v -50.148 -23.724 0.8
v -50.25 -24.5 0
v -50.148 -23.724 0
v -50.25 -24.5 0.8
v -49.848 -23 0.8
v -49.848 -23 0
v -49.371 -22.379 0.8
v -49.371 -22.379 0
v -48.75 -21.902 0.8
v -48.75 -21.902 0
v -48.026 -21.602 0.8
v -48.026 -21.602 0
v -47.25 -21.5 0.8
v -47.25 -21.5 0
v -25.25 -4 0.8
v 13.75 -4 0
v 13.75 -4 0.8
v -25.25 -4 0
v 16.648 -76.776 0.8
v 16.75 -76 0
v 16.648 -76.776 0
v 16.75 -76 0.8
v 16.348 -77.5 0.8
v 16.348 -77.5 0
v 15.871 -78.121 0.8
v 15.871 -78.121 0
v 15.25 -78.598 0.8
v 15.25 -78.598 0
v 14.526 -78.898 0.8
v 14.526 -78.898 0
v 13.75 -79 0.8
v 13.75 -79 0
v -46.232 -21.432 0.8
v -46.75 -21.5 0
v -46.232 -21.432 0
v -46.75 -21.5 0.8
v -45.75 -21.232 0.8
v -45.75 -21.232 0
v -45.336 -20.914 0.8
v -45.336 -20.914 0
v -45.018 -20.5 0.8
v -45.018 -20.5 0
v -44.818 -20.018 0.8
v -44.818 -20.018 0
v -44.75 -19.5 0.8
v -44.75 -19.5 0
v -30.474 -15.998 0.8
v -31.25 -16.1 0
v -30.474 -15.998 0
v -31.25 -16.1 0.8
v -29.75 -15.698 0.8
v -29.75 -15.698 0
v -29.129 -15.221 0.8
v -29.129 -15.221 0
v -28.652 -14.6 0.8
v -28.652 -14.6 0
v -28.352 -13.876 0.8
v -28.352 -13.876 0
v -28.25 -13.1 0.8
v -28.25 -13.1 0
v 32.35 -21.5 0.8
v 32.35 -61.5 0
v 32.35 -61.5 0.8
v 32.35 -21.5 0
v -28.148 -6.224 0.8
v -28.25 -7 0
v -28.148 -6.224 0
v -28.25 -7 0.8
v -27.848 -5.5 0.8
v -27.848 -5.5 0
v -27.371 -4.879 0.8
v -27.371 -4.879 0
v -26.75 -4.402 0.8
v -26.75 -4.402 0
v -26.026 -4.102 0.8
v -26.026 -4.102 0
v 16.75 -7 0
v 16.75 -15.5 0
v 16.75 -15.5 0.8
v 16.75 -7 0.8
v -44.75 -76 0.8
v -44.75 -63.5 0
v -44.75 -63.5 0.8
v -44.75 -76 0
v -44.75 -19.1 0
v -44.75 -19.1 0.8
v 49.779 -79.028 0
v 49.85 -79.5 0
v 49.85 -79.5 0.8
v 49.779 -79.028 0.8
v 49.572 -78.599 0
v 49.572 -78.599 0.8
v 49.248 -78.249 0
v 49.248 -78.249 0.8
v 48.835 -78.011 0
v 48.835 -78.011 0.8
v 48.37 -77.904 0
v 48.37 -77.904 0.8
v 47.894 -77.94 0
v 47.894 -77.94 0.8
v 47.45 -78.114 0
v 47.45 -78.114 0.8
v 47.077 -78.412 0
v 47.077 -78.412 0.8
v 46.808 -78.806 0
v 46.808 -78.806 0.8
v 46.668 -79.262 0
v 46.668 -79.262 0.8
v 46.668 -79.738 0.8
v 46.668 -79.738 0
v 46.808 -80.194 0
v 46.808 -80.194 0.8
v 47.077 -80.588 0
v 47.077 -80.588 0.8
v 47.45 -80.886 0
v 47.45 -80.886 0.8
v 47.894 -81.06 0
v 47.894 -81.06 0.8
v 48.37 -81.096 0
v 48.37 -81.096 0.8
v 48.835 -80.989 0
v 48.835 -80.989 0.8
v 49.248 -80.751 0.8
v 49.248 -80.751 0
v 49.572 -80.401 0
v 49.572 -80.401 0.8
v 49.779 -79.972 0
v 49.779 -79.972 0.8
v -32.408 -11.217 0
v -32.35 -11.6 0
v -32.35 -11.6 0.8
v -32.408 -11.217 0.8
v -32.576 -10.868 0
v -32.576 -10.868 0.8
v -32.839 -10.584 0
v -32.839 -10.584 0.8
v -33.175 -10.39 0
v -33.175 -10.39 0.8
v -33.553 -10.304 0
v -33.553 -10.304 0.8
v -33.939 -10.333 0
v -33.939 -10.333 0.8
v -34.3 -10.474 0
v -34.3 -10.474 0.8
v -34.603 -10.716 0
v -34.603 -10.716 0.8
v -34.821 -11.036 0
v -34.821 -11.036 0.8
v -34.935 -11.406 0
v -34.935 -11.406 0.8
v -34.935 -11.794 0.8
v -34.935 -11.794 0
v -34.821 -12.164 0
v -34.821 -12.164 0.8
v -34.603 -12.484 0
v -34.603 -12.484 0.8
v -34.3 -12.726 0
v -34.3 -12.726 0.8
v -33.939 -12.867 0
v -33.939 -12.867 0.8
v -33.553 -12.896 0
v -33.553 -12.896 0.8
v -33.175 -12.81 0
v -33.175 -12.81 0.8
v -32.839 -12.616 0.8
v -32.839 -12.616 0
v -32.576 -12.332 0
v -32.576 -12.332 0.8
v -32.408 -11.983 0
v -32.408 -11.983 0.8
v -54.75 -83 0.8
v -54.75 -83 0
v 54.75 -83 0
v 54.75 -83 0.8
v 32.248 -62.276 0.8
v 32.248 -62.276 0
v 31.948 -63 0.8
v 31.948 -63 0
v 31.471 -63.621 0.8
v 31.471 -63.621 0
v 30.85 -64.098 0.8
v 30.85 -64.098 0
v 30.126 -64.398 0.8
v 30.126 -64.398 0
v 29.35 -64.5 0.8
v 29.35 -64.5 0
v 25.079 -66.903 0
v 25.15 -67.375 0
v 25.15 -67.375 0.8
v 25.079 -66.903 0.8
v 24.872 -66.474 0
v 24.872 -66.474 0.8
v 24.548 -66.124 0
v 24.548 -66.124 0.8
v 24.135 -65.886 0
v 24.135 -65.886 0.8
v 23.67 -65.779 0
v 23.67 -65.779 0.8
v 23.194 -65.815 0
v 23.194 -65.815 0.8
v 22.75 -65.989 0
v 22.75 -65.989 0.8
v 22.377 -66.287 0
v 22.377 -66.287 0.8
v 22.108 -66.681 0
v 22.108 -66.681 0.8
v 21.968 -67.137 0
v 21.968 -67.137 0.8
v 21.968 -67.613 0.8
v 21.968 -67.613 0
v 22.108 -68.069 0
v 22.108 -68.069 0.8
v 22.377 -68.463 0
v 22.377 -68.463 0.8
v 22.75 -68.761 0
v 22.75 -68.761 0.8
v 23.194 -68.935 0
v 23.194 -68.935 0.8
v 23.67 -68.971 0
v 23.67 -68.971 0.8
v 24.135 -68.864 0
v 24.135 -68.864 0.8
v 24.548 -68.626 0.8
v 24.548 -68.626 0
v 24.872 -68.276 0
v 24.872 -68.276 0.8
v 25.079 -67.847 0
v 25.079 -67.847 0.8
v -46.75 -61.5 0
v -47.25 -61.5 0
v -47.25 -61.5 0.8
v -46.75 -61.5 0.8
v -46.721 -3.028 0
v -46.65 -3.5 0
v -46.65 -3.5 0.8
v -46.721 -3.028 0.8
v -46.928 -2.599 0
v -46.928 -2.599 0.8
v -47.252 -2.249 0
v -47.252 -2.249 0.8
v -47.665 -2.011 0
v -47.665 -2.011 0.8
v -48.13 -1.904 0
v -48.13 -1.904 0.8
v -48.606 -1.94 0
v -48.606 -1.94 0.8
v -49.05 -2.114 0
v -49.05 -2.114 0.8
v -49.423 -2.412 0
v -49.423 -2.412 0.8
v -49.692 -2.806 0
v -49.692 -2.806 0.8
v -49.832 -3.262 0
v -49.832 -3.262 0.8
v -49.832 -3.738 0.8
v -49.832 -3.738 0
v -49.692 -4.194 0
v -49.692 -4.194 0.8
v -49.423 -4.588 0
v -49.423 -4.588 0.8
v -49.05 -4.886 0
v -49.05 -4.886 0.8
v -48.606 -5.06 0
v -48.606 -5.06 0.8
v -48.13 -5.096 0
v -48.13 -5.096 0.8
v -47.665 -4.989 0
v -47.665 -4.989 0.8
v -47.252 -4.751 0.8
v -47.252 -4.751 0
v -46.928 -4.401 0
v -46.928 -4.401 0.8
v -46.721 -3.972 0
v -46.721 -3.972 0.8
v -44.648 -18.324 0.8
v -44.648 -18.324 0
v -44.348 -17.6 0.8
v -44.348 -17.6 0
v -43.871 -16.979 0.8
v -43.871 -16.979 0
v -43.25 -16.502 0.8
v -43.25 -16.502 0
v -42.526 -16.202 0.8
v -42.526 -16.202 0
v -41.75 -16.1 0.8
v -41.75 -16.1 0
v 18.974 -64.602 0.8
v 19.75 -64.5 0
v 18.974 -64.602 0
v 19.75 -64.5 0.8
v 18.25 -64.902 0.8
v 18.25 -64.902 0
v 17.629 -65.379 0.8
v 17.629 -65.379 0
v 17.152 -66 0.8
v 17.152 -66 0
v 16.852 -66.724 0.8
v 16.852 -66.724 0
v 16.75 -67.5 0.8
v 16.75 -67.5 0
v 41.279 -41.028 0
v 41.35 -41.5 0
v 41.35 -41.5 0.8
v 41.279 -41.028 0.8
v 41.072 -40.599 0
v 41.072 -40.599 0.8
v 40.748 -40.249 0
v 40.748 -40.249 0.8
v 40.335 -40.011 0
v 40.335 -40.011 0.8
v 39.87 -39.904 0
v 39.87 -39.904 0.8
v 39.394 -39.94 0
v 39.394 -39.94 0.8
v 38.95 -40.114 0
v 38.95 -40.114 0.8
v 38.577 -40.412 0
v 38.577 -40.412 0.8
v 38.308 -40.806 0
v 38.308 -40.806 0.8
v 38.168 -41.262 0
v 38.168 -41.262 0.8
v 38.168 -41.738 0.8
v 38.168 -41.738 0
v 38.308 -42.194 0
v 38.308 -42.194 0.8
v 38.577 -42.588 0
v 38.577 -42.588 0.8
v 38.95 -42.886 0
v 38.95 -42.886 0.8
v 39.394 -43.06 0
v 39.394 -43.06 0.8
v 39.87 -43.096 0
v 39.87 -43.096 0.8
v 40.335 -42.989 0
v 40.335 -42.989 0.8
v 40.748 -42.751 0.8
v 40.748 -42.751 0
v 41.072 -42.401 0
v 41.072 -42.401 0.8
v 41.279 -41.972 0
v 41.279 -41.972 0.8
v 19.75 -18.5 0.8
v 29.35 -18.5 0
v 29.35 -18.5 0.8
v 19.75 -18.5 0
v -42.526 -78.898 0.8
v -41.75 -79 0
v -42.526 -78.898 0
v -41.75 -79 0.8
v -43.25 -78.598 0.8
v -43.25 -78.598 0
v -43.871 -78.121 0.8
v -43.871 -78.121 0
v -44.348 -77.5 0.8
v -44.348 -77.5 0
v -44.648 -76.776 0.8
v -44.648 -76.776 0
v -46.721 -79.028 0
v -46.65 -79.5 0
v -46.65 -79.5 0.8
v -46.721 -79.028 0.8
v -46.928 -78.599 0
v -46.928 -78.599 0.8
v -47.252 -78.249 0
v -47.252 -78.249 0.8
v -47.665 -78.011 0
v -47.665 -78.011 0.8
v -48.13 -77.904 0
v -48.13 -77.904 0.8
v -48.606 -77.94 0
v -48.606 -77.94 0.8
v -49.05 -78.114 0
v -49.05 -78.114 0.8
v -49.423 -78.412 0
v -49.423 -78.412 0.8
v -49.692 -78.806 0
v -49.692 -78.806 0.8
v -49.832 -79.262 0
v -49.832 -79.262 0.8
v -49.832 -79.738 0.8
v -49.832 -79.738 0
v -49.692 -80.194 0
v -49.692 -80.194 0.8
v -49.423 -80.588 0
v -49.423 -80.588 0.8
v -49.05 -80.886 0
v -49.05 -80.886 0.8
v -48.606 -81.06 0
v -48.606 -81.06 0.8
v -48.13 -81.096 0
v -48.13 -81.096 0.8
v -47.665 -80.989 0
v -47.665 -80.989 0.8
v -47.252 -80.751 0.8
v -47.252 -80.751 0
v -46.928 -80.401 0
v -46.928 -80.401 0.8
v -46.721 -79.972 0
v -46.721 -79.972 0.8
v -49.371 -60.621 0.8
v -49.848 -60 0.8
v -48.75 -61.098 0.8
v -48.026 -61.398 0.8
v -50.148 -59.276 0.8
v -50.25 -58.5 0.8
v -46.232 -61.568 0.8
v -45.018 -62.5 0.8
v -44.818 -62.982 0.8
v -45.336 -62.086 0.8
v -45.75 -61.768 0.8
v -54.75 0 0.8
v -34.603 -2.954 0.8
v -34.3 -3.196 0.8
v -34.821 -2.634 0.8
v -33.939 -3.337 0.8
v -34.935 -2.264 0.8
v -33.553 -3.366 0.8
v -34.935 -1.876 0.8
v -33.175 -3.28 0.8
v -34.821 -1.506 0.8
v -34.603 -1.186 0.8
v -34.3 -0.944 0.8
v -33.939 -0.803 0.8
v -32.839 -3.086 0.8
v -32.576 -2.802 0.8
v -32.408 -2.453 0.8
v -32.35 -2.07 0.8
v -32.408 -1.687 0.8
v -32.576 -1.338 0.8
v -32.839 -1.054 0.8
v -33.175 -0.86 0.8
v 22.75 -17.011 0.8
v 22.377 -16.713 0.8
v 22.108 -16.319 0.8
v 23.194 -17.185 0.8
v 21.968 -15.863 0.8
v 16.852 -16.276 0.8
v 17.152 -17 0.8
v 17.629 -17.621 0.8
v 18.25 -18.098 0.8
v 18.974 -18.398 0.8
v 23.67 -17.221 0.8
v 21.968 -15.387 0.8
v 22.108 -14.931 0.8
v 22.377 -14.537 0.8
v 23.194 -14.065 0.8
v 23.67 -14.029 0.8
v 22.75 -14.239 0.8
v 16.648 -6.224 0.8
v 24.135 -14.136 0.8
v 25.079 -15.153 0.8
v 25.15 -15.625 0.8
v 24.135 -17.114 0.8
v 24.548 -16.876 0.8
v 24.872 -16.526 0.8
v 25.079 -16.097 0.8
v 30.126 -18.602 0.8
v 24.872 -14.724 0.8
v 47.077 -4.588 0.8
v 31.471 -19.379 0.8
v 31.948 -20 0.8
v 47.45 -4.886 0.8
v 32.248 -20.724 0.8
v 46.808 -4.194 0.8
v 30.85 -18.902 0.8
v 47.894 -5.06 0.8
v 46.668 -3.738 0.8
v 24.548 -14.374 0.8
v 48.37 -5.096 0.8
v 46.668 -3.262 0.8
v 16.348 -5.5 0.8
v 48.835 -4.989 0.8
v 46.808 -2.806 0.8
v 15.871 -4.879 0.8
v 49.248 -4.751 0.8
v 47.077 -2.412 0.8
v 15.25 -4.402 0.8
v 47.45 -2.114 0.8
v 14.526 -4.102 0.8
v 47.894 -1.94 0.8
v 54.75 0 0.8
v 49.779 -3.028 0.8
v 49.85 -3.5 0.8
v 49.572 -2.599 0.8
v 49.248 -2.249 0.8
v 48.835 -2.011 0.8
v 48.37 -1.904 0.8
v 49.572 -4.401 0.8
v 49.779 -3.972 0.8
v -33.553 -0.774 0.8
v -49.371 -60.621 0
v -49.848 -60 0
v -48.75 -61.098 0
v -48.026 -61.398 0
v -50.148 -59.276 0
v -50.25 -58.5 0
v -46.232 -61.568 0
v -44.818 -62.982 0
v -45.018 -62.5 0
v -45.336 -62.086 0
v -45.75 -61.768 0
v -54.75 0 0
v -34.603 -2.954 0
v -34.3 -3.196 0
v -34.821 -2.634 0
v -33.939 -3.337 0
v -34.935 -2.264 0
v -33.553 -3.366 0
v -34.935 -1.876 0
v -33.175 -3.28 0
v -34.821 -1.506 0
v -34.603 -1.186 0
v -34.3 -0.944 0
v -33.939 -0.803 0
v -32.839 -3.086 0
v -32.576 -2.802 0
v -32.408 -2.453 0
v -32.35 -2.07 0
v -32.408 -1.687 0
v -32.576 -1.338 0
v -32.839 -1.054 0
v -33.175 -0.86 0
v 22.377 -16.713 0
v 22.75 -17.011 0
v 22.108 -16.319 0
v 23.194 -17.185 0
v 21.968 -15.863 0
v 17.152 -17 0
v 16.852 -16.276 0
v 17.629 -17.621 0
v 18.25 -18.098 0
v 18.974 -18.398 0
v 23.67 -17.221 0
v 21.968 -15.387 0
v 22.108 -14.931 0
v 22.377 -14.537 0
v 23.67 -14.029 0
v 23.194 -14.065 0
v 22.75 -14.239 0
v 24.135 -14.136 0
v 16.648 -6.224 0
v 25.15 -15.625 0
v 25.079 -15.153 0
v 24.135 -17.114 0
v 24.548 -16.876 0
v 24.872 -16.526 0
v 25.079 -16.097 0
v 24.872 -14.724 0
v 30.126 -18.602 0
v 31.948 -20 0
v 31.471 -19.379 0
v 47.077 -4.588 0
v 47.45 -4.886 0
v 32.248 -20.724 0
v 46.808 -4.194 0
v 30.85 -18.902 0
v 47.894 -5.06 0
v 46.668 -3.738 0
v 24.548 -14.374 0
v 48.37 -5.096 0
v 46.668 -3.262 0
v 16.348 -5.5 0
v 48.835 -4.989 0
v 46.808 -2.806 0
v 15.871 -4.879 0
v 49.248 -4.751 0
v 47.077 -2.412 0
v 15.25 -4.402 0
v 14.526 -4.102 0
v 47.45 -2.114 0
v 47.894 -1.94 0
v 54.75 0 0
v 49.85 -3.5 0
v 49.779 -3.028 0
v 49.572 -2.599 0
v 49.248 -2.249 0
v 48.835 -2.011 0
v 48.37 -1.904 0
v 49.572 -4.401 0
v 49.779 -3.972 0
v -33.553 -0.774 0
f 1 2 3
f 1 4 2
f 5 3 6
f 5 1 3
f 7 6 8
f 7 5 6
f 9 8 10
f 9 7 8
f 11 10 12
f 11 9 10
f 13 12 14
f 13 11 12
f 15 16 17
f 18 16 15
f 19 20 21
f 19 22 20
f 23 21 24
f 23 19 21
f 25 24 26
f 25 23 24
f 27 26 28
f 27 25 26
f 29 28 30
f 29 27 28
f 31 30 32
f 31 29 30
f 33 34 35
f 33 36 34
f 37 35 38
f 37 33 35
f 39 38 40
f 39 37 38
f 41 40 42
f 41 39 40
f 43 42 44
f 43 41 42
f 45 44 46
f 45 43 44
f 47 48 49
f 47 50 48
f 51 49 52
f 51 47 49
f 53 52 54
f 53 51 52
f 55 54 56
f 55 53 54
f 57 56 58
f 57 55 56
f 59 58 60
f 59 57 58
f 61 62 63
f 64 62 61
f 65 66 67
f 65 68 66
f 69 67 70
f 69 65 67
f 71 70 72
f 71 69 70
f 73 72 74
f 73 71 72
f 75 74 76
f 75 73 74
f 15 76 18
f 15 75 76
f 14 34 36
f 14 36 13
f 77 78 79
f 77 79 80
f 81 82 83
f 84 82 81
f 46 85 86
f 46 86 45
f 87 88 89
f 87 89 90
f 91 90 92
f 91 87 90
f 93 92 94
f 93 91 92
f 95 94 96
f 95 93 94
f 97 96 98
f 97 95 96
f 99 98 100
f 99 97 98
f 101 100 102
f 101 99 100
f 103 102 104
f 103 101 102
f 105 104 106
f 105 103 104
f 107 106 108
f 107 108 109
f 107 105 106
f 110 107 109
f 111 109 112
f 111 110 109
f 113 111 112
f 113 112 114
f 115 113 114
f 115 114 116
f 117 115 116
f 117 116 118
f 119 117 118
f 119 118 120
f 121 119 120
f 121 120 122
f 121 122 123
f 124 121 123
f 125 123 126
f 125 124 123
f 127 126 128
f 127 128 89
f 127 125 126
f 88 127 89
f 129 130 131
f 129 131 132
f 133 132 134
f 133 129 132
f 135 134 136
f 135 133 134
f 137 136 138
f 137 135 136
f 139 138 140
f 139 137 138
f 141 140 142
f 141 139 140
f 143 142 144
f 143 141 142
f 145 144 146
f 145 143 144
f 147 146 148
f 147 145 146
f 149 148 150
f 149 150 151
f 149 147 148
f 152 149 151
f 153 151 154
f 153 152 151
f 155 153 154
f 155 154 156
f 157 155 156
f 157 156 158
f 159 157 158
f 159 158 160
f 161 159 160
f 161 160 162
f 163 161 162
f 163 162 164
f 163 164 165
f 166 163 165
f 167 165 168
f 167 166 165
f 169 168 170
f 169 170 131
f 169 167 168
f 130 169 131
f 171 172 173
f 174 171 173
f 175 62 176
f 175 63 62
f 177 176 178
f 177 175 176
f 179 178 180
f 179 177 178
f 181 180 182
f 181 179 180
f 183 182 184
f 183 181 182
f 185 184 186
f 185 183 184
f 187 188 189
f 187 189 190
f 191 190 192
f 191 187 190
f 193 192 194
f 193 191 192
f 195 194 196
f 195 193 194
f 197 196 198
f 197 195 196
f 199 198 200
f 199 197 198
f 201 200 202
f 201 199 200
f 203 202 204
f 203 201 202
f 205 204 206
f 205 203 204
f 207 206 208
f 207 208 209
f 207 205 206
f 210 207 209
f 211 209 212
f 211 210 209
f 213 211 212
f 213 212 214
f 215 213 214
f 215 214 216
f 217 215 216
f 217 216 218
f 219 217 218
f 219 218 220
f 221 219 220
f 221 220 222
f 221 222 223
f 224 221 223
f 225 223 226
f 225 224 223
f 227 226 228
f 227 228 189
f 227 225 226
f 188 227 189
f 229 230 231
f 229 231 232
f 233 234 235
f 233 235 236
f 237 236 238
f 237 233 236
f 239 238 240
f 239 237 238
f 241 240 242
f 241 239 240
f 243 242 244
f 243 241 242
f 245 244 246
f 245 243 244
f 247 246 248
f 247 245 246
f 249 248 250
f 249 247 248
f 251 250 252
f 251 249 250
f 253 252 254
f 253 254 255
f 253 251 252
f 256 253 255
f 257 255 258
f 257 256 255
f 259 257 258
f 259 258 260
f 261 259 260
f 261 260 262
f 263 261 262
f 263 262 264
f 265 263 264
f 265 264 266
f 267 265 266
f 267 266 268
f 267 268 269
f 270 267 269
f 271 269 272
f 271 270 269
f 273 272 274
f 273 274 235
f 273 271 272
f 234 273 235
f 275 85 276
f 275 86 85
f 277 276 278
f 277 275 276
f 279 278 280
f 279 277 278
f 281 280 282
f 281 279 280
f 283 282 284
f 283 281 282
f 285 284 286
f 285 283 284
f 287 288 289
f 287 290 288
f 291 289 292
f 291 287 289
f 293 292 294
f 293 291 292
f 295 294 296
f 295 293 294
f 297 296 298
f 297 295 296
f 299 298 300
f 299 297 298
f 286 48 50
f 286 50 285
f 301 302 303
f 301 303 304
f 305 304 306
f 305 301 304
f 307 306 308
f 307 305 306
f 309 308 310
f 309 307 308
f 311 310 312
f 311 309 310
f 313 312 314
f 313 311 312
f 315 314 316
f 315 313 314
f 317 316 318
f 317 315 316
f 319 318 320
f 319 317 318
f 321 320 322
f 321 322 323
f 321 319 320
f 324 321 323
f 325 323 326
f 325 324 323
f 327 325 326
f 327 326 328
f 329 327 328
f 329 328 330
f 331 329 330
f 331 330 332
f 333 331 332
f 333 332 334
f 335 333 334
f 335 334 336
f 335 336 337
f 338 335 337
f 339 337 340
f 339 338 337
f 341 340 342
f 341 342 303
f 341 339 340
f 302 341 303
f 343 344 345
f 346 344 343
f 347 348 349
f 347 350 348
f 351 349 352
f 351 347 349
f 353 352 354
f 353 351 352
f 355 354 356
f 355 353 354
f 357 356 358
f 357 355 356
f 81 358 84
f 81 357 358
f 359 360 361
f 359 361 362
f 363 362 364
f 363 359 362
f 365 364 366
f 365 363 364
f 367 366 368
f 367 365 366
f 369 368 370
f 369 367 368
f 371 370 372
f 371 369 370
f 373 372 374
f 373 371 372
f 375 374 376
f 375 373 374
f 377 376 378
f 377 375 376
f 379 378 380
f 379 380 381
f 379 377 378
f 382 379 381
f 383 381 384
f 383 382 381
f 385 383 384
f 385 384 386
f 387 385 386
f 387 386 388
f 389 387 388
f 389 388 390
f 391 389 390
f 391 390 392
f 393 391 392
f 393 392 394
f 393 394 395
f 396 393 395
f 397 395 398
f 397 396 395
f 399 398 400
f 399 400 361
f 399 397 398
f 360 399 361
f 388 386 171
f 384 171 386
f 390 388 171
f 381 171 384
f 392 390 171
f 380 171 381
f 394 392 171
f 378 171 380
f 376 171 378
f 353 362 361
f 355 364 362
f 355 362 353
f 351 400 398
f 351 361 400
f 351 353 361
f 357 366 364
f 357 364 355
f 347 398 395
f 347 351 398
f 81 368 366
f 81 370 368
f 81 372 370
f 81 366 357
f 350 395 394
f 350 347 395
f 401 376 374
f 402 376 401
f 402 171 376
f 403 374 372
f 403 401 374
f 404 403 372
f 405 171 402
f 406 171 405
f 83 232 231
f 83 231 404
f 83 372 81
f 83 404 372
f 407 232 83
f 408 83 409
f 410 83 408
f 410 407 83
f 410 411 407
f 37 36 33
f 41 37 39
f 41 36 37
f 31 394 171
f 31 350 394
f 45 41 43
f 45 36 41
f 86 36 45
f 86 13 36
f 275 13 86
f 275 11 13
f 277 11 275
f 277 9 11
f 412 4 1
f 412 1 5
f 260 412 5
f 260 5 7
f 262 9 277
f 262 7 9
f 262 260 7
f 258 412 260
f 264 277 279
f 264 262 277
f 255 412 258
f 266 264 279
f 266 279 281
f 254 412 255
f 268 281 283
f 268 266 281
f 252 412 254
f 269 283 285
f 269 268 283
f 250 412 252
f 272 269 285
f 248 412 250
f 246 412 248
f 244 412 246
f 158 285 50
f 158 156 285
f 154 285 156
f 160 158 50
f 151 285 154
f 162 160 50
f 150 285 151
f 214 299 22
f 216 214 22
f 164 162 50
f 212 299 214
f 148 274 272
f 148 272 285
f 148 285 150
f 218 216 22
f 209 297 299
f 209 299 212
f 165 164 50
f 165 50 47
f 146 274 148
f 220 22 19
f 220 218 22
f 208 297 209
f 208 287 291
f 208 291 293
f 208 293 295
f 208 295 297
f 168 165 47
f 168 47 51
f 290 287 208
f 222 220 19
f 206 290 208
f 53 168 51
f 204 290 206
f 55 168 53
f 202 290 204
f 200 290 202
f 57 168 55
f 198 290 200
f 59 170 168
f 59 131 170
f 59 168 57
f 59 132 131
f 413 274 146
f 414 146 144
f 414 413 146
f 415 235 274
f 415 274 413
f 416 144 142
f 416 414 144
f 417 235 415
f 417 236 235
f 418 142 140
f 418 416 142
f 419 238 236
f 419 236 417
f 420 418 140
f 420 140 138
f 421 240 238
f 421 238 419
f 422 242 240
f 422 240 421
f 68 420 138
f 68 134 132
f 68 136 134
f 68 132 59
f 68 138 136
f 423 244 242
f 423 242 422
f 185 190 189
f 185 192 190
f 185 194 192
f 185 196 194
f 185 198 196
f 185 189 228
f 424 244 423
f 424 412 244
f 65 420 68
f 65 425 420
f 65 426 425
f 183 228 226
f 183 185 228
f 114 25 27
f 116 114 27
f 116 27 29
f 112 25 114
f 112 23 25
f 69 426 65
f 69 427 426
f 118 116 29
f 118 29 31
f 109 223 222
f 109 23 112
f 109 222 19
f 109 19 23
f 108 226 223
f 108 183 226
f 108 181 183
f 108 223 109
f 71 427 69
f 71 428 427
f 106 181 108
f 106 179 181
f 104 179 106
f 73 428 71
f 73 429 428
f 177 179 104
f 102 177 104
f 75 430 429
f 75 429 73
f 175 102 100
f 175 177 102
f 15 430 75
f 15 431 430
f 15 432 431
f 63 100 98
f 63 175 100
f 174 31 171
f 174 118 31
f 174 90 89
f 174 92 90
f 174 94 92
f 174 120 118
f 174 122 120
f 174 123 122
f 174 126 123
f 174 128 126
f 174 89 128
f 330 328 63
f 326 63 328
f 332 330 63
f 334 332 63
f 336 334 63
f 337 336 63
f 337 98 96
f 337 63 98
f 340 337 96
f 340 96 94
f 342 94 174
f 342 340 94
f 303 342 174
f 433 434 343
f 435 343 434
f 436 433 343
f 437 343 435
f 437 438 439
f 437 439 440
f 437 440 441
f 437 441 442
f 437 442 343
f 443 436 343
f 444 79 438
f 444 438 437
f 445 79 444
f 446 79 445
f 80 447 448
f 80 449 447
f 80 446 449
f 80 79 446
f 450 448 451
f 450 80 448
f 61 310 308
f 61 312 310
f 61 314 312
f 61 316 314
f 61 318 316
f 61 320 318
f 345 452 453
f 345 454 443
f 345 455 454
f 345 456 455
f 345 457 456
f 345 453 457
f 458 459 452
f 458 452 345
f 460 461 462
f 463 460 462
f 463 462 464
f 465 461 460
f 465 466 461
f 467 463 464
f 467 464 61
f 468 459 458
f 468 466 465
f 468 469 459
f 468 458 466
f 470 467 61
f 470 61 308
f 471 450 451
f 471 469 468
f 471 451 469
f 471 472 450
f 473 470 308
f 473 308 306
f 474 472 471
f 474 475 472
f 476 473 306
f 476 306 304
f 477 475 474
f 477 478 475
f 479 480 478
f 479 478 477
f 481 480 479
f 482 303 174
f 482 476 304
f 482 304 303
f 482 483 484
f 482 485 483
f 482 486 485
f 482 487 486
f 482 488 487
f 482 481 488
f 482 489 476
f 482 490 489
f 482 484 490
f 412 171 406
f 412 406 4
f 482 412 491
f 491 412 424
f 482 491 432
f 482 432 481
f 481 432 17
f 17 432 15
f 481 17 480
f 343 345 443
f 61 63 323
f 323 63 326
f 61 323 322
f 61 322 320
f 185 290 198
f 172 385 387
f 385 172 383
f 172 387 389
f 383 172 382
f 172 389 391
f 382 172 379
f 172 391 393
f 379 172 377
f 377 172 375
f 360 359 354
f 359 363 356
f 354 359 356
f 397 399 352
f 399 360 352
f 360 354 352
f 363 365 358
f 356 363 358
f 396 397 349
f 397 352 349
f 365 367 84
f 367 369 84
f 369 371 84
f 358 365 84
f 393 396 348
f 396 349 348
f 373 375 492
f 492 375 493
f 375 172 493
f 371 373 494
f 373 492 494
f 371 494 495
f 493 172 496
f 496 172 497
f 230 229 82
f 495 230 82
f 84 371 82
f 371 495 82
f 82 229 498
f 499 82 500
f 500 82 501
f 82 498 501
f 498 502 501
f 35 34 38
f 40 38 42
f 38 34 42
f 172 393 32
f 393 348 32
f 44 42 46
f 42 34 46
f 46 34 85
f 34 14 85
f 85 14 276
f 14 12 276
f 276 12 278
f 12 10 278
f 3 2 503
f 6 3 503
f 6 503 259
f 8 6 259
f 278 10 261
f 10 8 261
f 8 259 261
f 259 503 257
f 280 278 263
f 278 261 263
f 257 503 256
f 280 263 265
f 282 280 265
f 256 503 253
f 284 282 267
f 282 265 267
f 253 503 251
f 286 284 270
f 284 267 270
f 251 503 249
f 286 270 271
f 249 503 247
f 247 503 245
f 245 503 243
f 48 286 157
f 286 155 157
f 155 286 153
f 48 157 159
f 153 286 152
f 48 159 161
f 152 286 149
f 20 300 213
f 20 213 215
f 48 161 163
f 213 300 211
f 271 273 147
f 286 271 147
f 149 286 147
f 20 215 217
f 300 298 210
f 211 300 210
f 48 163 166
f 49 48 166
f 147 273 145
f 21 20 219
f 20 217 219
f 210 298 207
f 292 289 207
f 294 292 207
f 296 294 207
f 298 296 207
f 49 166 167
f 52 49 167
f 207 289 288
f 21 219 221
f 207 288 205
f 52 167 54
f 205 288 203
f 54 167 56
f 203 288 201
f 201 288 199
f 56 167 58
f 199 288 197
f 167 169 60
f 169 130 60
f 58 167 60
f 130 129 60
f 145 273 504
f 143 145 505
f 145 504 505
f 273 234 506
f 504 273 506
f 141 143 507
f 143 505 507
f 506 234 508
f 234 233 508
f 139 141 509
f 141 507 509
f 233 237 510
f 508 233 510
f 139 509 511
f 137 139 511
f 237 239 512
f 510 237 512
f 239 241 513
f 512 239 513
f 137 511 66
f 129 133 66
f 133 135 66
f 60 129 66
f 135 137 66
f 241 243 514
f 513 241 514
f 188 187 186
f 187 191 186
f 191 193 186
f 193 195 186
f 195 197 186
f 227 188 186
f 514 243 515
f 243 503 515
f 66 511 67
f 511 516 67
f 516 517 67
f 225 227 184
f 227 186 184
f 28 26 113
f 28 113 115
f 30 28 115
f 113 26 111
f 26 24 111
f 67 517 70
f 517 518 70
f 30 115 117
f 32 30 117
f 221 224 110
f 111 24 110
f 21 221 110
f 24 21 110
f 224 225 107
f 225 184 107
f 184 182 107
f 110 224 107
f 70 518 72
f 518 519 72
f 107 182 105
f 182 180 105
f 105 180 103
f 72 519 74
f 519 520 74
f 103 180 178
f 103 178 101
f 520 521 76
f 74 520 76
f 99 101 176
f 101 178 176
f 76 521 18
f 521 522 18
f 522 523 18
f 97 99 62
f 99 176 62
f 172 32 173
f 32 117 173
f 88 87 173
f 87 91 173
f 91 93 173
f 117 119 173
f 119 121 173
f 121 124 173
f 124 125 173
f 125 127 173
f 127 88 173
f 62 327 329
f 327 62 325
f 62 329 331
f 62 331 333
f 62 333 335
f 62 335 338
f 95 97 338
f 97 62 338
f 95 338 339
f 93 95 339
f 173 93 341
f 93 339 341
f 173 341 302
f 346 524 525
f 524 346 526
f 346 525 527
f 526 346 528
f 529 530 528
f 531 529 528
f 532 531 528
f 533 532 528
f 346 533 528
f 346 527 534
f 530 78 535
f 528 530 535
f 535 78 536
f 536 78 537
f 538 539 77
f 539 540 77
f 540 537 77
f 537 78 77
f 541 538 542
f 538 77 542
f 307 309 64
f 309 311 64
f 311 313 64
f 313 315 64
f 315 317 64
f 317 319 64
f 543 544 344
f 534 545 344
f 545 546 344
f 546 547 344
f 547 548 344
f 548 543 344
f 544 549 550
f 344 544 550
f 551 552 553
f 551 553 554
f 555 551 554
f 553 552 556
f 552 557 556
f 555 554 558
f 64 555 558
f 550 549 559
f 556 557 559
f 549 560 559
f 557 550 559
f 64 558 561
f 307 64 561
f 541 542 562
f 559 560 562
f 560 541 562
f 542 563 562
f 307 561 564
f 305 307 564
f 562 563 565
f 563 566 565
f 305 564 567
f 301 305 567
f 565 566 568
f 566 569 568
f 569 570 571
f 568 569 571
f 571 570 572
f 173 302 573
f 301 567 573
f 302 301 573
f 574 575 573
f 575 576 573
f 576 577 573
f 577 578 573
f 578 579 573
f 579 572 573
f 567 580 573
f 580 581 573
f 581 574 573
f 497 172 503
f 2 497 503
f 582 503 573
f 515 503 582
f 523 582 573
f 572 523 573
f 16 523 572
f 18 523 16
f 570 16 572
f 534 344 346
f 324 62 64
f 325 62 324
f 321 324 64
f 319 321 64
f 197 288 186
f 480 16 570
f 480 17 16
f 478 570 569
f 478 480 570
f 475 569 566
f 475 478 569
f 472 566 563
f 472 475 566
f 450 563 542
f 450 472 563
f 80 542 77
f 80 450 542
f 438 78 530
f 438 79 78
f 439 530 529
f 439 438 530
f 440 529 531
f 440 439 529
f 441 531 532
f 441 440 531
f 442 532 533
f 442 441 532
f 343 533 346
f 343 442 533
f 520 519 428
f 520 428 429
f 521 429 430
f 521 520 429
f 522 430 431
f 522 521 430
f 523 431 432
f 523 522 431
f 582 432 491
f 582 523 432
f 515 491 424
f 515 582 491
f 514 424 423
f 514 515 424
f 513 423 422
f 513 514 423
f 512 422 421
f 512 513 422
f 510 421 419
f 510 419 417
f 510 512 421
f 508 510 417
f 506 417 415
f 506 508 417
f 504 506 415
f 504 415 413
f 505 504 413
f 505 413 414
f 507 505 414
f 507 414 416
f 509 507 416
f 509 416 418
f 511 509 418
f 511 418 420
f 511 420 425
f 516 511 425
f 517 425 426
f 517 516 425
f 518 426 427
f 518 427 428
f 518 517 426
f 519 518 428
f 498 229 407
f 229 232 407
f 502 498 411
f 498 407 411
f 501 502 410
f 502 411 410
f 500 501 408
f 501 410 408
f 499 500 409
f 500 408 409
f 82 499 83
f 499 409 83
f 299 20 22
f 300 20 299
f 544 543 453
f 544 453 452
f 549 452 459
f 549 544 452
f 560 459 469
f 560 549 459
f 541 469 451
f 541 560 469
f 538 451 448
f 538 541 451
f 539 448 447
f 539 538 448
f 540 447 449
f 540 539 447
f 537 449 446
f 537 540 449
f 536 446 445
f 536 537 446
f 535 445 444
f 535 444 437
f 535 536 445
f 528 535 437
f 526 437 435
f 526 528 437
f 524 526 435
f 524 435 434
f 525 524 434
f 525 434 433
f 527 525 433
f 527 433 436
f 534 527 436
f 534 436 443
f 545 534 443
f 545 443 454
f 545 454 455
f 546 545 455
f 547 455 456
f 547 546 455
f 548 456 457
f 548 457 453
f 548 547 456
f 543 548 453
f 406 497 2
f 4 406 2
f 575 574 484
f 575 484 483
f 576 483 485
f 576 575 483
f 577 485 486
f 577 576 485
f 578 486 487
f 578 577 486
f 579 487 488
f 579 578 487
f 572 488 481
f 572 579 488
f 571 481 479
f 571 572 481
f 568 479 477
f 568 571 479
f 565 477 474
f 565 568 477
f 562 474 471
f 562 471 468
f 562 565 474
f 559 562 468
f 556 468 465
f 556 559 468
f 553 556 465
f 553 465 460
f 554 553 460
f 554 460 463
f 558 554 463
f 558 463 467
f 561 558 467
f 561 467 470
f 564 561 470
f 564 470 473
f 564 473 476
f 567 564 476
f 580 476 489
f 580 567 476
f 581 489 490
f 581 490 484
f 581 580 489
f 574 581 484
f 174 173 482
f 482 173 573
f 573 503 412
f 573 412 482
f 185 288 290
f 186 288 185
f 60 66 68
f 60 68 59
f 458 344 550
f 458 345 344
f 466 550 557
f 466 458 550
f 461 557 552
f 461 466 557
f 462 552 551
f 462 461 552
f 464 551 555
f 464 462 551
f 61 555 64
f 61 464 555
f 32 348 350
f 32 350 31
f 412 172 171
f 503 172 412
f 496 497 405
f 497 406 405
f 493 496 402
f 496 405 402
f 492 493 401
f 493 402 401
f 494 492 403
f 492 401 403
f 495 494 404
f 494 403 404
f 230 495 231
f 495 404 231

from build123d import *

# Parameters (mm, degrees)
SKETCH1_W           = 109.5
SKETCH1_H           = 83
SKETCH1_R           = 1.6
SKETCH1_R_2         = 1.3
BOSS_EXTRUDE1_DEPTH = 0.8
FILLET1_R           = 3
FILLET2_R           = 2


with BuildPart() as part:
    # Sketch1 → Boss-Extrude1 (new body)
    with BuildSketch(Plane.XY):
        with Locations((0, -41.5)):
            Rectangle(SKETCH1_W, SKETCH1_H)
        with Locations((23.55, -67.375)):
            Circle(SKETCH1_R, mode=Mode.SUBTRACT)
        with Locations((23.55, -15.625)):
            Circle(SKETCH1_R, mode=Mode.SUBTRACT)
        with Locations((48.25, -3.5)):
            Circle(SKETCH1_R, mode=Mode.SUBTRACT)
        with Locations((48.25, -79.5)):
            Circle(SKETCH1_R, mode=Mode.SUBTRACT)
        with Locations((-48.25, -79.5)):
            Circle(SKETCH1_R, mode=Mode.SUBTRACT)
        with Locations((-48.25, -3.5)):
            Circle(SKETCH1_R, mode=Mode.SUBTRACT)
        with Locations((-33.65, -2.07)):
            Circle(SKETCH1_R_2, mode=Mode.SUBTRACT)
        with Locations((-33.65, -11.6)):
            Circle(SKETCH1_R_2, mode=Mode.SUBTRACT)
        with Locations((39.75, -41.5)):
            Circle(SKETCH1_R, mode=Mode.SUBTRACT)
        Polygon((-50.25, -41.5), (-50.25, -61.5), (-44.75, -61.5), (-44.75, -79), (16.75, -79), (16.75, -64.5), (32.35, -64.5), (32.35, -18.5), (16.75, -18.5), (16.75, -4), (-28.25, -4), (-28.25, -16.1), (-44.75, -16.1), (-44.75, -21.5), (-50.25, -21.5), align=None, mode=Mode.SUBTRACT)
    extrude(amount=BOSS_EXTRUDE1_DEPTH)

    # Fillet1
    fillet1_edges = [part.edges().sort_by_distance(p)[0] for p in [
        (32.35, -64.5, 0.4),
        (32.35, -18.5, 0.4),
        (16.75, -18.5, 0.4),
        (16.75, -4, 0.4),
        (-28.25, -4, 0.4),
        (-28.25, -16.1, 0.4),
        (-44.75, -16.1, 0.4),
        (-50.25, -21.5, 0.4),
        (-50.25, -61.5, 0.4),
        (-44.75, -79, 0.4),
        (16.75, -79, 0.4),
        (16.75, -64.5, 0.4),
    ]]
    fillet(fillet1_edges, radius=FILLET1_R)

    # Fillet2
    fillet2_edges = [part.edges().sort_by_distance(p)[0] for p in [
        (-44.75, -21.5, 0.4),
        (-44.75, -61.5, 0.4),
    ]]
    fillet(fillet2_edges, radius=FILLET2_R)


solid = part.part
